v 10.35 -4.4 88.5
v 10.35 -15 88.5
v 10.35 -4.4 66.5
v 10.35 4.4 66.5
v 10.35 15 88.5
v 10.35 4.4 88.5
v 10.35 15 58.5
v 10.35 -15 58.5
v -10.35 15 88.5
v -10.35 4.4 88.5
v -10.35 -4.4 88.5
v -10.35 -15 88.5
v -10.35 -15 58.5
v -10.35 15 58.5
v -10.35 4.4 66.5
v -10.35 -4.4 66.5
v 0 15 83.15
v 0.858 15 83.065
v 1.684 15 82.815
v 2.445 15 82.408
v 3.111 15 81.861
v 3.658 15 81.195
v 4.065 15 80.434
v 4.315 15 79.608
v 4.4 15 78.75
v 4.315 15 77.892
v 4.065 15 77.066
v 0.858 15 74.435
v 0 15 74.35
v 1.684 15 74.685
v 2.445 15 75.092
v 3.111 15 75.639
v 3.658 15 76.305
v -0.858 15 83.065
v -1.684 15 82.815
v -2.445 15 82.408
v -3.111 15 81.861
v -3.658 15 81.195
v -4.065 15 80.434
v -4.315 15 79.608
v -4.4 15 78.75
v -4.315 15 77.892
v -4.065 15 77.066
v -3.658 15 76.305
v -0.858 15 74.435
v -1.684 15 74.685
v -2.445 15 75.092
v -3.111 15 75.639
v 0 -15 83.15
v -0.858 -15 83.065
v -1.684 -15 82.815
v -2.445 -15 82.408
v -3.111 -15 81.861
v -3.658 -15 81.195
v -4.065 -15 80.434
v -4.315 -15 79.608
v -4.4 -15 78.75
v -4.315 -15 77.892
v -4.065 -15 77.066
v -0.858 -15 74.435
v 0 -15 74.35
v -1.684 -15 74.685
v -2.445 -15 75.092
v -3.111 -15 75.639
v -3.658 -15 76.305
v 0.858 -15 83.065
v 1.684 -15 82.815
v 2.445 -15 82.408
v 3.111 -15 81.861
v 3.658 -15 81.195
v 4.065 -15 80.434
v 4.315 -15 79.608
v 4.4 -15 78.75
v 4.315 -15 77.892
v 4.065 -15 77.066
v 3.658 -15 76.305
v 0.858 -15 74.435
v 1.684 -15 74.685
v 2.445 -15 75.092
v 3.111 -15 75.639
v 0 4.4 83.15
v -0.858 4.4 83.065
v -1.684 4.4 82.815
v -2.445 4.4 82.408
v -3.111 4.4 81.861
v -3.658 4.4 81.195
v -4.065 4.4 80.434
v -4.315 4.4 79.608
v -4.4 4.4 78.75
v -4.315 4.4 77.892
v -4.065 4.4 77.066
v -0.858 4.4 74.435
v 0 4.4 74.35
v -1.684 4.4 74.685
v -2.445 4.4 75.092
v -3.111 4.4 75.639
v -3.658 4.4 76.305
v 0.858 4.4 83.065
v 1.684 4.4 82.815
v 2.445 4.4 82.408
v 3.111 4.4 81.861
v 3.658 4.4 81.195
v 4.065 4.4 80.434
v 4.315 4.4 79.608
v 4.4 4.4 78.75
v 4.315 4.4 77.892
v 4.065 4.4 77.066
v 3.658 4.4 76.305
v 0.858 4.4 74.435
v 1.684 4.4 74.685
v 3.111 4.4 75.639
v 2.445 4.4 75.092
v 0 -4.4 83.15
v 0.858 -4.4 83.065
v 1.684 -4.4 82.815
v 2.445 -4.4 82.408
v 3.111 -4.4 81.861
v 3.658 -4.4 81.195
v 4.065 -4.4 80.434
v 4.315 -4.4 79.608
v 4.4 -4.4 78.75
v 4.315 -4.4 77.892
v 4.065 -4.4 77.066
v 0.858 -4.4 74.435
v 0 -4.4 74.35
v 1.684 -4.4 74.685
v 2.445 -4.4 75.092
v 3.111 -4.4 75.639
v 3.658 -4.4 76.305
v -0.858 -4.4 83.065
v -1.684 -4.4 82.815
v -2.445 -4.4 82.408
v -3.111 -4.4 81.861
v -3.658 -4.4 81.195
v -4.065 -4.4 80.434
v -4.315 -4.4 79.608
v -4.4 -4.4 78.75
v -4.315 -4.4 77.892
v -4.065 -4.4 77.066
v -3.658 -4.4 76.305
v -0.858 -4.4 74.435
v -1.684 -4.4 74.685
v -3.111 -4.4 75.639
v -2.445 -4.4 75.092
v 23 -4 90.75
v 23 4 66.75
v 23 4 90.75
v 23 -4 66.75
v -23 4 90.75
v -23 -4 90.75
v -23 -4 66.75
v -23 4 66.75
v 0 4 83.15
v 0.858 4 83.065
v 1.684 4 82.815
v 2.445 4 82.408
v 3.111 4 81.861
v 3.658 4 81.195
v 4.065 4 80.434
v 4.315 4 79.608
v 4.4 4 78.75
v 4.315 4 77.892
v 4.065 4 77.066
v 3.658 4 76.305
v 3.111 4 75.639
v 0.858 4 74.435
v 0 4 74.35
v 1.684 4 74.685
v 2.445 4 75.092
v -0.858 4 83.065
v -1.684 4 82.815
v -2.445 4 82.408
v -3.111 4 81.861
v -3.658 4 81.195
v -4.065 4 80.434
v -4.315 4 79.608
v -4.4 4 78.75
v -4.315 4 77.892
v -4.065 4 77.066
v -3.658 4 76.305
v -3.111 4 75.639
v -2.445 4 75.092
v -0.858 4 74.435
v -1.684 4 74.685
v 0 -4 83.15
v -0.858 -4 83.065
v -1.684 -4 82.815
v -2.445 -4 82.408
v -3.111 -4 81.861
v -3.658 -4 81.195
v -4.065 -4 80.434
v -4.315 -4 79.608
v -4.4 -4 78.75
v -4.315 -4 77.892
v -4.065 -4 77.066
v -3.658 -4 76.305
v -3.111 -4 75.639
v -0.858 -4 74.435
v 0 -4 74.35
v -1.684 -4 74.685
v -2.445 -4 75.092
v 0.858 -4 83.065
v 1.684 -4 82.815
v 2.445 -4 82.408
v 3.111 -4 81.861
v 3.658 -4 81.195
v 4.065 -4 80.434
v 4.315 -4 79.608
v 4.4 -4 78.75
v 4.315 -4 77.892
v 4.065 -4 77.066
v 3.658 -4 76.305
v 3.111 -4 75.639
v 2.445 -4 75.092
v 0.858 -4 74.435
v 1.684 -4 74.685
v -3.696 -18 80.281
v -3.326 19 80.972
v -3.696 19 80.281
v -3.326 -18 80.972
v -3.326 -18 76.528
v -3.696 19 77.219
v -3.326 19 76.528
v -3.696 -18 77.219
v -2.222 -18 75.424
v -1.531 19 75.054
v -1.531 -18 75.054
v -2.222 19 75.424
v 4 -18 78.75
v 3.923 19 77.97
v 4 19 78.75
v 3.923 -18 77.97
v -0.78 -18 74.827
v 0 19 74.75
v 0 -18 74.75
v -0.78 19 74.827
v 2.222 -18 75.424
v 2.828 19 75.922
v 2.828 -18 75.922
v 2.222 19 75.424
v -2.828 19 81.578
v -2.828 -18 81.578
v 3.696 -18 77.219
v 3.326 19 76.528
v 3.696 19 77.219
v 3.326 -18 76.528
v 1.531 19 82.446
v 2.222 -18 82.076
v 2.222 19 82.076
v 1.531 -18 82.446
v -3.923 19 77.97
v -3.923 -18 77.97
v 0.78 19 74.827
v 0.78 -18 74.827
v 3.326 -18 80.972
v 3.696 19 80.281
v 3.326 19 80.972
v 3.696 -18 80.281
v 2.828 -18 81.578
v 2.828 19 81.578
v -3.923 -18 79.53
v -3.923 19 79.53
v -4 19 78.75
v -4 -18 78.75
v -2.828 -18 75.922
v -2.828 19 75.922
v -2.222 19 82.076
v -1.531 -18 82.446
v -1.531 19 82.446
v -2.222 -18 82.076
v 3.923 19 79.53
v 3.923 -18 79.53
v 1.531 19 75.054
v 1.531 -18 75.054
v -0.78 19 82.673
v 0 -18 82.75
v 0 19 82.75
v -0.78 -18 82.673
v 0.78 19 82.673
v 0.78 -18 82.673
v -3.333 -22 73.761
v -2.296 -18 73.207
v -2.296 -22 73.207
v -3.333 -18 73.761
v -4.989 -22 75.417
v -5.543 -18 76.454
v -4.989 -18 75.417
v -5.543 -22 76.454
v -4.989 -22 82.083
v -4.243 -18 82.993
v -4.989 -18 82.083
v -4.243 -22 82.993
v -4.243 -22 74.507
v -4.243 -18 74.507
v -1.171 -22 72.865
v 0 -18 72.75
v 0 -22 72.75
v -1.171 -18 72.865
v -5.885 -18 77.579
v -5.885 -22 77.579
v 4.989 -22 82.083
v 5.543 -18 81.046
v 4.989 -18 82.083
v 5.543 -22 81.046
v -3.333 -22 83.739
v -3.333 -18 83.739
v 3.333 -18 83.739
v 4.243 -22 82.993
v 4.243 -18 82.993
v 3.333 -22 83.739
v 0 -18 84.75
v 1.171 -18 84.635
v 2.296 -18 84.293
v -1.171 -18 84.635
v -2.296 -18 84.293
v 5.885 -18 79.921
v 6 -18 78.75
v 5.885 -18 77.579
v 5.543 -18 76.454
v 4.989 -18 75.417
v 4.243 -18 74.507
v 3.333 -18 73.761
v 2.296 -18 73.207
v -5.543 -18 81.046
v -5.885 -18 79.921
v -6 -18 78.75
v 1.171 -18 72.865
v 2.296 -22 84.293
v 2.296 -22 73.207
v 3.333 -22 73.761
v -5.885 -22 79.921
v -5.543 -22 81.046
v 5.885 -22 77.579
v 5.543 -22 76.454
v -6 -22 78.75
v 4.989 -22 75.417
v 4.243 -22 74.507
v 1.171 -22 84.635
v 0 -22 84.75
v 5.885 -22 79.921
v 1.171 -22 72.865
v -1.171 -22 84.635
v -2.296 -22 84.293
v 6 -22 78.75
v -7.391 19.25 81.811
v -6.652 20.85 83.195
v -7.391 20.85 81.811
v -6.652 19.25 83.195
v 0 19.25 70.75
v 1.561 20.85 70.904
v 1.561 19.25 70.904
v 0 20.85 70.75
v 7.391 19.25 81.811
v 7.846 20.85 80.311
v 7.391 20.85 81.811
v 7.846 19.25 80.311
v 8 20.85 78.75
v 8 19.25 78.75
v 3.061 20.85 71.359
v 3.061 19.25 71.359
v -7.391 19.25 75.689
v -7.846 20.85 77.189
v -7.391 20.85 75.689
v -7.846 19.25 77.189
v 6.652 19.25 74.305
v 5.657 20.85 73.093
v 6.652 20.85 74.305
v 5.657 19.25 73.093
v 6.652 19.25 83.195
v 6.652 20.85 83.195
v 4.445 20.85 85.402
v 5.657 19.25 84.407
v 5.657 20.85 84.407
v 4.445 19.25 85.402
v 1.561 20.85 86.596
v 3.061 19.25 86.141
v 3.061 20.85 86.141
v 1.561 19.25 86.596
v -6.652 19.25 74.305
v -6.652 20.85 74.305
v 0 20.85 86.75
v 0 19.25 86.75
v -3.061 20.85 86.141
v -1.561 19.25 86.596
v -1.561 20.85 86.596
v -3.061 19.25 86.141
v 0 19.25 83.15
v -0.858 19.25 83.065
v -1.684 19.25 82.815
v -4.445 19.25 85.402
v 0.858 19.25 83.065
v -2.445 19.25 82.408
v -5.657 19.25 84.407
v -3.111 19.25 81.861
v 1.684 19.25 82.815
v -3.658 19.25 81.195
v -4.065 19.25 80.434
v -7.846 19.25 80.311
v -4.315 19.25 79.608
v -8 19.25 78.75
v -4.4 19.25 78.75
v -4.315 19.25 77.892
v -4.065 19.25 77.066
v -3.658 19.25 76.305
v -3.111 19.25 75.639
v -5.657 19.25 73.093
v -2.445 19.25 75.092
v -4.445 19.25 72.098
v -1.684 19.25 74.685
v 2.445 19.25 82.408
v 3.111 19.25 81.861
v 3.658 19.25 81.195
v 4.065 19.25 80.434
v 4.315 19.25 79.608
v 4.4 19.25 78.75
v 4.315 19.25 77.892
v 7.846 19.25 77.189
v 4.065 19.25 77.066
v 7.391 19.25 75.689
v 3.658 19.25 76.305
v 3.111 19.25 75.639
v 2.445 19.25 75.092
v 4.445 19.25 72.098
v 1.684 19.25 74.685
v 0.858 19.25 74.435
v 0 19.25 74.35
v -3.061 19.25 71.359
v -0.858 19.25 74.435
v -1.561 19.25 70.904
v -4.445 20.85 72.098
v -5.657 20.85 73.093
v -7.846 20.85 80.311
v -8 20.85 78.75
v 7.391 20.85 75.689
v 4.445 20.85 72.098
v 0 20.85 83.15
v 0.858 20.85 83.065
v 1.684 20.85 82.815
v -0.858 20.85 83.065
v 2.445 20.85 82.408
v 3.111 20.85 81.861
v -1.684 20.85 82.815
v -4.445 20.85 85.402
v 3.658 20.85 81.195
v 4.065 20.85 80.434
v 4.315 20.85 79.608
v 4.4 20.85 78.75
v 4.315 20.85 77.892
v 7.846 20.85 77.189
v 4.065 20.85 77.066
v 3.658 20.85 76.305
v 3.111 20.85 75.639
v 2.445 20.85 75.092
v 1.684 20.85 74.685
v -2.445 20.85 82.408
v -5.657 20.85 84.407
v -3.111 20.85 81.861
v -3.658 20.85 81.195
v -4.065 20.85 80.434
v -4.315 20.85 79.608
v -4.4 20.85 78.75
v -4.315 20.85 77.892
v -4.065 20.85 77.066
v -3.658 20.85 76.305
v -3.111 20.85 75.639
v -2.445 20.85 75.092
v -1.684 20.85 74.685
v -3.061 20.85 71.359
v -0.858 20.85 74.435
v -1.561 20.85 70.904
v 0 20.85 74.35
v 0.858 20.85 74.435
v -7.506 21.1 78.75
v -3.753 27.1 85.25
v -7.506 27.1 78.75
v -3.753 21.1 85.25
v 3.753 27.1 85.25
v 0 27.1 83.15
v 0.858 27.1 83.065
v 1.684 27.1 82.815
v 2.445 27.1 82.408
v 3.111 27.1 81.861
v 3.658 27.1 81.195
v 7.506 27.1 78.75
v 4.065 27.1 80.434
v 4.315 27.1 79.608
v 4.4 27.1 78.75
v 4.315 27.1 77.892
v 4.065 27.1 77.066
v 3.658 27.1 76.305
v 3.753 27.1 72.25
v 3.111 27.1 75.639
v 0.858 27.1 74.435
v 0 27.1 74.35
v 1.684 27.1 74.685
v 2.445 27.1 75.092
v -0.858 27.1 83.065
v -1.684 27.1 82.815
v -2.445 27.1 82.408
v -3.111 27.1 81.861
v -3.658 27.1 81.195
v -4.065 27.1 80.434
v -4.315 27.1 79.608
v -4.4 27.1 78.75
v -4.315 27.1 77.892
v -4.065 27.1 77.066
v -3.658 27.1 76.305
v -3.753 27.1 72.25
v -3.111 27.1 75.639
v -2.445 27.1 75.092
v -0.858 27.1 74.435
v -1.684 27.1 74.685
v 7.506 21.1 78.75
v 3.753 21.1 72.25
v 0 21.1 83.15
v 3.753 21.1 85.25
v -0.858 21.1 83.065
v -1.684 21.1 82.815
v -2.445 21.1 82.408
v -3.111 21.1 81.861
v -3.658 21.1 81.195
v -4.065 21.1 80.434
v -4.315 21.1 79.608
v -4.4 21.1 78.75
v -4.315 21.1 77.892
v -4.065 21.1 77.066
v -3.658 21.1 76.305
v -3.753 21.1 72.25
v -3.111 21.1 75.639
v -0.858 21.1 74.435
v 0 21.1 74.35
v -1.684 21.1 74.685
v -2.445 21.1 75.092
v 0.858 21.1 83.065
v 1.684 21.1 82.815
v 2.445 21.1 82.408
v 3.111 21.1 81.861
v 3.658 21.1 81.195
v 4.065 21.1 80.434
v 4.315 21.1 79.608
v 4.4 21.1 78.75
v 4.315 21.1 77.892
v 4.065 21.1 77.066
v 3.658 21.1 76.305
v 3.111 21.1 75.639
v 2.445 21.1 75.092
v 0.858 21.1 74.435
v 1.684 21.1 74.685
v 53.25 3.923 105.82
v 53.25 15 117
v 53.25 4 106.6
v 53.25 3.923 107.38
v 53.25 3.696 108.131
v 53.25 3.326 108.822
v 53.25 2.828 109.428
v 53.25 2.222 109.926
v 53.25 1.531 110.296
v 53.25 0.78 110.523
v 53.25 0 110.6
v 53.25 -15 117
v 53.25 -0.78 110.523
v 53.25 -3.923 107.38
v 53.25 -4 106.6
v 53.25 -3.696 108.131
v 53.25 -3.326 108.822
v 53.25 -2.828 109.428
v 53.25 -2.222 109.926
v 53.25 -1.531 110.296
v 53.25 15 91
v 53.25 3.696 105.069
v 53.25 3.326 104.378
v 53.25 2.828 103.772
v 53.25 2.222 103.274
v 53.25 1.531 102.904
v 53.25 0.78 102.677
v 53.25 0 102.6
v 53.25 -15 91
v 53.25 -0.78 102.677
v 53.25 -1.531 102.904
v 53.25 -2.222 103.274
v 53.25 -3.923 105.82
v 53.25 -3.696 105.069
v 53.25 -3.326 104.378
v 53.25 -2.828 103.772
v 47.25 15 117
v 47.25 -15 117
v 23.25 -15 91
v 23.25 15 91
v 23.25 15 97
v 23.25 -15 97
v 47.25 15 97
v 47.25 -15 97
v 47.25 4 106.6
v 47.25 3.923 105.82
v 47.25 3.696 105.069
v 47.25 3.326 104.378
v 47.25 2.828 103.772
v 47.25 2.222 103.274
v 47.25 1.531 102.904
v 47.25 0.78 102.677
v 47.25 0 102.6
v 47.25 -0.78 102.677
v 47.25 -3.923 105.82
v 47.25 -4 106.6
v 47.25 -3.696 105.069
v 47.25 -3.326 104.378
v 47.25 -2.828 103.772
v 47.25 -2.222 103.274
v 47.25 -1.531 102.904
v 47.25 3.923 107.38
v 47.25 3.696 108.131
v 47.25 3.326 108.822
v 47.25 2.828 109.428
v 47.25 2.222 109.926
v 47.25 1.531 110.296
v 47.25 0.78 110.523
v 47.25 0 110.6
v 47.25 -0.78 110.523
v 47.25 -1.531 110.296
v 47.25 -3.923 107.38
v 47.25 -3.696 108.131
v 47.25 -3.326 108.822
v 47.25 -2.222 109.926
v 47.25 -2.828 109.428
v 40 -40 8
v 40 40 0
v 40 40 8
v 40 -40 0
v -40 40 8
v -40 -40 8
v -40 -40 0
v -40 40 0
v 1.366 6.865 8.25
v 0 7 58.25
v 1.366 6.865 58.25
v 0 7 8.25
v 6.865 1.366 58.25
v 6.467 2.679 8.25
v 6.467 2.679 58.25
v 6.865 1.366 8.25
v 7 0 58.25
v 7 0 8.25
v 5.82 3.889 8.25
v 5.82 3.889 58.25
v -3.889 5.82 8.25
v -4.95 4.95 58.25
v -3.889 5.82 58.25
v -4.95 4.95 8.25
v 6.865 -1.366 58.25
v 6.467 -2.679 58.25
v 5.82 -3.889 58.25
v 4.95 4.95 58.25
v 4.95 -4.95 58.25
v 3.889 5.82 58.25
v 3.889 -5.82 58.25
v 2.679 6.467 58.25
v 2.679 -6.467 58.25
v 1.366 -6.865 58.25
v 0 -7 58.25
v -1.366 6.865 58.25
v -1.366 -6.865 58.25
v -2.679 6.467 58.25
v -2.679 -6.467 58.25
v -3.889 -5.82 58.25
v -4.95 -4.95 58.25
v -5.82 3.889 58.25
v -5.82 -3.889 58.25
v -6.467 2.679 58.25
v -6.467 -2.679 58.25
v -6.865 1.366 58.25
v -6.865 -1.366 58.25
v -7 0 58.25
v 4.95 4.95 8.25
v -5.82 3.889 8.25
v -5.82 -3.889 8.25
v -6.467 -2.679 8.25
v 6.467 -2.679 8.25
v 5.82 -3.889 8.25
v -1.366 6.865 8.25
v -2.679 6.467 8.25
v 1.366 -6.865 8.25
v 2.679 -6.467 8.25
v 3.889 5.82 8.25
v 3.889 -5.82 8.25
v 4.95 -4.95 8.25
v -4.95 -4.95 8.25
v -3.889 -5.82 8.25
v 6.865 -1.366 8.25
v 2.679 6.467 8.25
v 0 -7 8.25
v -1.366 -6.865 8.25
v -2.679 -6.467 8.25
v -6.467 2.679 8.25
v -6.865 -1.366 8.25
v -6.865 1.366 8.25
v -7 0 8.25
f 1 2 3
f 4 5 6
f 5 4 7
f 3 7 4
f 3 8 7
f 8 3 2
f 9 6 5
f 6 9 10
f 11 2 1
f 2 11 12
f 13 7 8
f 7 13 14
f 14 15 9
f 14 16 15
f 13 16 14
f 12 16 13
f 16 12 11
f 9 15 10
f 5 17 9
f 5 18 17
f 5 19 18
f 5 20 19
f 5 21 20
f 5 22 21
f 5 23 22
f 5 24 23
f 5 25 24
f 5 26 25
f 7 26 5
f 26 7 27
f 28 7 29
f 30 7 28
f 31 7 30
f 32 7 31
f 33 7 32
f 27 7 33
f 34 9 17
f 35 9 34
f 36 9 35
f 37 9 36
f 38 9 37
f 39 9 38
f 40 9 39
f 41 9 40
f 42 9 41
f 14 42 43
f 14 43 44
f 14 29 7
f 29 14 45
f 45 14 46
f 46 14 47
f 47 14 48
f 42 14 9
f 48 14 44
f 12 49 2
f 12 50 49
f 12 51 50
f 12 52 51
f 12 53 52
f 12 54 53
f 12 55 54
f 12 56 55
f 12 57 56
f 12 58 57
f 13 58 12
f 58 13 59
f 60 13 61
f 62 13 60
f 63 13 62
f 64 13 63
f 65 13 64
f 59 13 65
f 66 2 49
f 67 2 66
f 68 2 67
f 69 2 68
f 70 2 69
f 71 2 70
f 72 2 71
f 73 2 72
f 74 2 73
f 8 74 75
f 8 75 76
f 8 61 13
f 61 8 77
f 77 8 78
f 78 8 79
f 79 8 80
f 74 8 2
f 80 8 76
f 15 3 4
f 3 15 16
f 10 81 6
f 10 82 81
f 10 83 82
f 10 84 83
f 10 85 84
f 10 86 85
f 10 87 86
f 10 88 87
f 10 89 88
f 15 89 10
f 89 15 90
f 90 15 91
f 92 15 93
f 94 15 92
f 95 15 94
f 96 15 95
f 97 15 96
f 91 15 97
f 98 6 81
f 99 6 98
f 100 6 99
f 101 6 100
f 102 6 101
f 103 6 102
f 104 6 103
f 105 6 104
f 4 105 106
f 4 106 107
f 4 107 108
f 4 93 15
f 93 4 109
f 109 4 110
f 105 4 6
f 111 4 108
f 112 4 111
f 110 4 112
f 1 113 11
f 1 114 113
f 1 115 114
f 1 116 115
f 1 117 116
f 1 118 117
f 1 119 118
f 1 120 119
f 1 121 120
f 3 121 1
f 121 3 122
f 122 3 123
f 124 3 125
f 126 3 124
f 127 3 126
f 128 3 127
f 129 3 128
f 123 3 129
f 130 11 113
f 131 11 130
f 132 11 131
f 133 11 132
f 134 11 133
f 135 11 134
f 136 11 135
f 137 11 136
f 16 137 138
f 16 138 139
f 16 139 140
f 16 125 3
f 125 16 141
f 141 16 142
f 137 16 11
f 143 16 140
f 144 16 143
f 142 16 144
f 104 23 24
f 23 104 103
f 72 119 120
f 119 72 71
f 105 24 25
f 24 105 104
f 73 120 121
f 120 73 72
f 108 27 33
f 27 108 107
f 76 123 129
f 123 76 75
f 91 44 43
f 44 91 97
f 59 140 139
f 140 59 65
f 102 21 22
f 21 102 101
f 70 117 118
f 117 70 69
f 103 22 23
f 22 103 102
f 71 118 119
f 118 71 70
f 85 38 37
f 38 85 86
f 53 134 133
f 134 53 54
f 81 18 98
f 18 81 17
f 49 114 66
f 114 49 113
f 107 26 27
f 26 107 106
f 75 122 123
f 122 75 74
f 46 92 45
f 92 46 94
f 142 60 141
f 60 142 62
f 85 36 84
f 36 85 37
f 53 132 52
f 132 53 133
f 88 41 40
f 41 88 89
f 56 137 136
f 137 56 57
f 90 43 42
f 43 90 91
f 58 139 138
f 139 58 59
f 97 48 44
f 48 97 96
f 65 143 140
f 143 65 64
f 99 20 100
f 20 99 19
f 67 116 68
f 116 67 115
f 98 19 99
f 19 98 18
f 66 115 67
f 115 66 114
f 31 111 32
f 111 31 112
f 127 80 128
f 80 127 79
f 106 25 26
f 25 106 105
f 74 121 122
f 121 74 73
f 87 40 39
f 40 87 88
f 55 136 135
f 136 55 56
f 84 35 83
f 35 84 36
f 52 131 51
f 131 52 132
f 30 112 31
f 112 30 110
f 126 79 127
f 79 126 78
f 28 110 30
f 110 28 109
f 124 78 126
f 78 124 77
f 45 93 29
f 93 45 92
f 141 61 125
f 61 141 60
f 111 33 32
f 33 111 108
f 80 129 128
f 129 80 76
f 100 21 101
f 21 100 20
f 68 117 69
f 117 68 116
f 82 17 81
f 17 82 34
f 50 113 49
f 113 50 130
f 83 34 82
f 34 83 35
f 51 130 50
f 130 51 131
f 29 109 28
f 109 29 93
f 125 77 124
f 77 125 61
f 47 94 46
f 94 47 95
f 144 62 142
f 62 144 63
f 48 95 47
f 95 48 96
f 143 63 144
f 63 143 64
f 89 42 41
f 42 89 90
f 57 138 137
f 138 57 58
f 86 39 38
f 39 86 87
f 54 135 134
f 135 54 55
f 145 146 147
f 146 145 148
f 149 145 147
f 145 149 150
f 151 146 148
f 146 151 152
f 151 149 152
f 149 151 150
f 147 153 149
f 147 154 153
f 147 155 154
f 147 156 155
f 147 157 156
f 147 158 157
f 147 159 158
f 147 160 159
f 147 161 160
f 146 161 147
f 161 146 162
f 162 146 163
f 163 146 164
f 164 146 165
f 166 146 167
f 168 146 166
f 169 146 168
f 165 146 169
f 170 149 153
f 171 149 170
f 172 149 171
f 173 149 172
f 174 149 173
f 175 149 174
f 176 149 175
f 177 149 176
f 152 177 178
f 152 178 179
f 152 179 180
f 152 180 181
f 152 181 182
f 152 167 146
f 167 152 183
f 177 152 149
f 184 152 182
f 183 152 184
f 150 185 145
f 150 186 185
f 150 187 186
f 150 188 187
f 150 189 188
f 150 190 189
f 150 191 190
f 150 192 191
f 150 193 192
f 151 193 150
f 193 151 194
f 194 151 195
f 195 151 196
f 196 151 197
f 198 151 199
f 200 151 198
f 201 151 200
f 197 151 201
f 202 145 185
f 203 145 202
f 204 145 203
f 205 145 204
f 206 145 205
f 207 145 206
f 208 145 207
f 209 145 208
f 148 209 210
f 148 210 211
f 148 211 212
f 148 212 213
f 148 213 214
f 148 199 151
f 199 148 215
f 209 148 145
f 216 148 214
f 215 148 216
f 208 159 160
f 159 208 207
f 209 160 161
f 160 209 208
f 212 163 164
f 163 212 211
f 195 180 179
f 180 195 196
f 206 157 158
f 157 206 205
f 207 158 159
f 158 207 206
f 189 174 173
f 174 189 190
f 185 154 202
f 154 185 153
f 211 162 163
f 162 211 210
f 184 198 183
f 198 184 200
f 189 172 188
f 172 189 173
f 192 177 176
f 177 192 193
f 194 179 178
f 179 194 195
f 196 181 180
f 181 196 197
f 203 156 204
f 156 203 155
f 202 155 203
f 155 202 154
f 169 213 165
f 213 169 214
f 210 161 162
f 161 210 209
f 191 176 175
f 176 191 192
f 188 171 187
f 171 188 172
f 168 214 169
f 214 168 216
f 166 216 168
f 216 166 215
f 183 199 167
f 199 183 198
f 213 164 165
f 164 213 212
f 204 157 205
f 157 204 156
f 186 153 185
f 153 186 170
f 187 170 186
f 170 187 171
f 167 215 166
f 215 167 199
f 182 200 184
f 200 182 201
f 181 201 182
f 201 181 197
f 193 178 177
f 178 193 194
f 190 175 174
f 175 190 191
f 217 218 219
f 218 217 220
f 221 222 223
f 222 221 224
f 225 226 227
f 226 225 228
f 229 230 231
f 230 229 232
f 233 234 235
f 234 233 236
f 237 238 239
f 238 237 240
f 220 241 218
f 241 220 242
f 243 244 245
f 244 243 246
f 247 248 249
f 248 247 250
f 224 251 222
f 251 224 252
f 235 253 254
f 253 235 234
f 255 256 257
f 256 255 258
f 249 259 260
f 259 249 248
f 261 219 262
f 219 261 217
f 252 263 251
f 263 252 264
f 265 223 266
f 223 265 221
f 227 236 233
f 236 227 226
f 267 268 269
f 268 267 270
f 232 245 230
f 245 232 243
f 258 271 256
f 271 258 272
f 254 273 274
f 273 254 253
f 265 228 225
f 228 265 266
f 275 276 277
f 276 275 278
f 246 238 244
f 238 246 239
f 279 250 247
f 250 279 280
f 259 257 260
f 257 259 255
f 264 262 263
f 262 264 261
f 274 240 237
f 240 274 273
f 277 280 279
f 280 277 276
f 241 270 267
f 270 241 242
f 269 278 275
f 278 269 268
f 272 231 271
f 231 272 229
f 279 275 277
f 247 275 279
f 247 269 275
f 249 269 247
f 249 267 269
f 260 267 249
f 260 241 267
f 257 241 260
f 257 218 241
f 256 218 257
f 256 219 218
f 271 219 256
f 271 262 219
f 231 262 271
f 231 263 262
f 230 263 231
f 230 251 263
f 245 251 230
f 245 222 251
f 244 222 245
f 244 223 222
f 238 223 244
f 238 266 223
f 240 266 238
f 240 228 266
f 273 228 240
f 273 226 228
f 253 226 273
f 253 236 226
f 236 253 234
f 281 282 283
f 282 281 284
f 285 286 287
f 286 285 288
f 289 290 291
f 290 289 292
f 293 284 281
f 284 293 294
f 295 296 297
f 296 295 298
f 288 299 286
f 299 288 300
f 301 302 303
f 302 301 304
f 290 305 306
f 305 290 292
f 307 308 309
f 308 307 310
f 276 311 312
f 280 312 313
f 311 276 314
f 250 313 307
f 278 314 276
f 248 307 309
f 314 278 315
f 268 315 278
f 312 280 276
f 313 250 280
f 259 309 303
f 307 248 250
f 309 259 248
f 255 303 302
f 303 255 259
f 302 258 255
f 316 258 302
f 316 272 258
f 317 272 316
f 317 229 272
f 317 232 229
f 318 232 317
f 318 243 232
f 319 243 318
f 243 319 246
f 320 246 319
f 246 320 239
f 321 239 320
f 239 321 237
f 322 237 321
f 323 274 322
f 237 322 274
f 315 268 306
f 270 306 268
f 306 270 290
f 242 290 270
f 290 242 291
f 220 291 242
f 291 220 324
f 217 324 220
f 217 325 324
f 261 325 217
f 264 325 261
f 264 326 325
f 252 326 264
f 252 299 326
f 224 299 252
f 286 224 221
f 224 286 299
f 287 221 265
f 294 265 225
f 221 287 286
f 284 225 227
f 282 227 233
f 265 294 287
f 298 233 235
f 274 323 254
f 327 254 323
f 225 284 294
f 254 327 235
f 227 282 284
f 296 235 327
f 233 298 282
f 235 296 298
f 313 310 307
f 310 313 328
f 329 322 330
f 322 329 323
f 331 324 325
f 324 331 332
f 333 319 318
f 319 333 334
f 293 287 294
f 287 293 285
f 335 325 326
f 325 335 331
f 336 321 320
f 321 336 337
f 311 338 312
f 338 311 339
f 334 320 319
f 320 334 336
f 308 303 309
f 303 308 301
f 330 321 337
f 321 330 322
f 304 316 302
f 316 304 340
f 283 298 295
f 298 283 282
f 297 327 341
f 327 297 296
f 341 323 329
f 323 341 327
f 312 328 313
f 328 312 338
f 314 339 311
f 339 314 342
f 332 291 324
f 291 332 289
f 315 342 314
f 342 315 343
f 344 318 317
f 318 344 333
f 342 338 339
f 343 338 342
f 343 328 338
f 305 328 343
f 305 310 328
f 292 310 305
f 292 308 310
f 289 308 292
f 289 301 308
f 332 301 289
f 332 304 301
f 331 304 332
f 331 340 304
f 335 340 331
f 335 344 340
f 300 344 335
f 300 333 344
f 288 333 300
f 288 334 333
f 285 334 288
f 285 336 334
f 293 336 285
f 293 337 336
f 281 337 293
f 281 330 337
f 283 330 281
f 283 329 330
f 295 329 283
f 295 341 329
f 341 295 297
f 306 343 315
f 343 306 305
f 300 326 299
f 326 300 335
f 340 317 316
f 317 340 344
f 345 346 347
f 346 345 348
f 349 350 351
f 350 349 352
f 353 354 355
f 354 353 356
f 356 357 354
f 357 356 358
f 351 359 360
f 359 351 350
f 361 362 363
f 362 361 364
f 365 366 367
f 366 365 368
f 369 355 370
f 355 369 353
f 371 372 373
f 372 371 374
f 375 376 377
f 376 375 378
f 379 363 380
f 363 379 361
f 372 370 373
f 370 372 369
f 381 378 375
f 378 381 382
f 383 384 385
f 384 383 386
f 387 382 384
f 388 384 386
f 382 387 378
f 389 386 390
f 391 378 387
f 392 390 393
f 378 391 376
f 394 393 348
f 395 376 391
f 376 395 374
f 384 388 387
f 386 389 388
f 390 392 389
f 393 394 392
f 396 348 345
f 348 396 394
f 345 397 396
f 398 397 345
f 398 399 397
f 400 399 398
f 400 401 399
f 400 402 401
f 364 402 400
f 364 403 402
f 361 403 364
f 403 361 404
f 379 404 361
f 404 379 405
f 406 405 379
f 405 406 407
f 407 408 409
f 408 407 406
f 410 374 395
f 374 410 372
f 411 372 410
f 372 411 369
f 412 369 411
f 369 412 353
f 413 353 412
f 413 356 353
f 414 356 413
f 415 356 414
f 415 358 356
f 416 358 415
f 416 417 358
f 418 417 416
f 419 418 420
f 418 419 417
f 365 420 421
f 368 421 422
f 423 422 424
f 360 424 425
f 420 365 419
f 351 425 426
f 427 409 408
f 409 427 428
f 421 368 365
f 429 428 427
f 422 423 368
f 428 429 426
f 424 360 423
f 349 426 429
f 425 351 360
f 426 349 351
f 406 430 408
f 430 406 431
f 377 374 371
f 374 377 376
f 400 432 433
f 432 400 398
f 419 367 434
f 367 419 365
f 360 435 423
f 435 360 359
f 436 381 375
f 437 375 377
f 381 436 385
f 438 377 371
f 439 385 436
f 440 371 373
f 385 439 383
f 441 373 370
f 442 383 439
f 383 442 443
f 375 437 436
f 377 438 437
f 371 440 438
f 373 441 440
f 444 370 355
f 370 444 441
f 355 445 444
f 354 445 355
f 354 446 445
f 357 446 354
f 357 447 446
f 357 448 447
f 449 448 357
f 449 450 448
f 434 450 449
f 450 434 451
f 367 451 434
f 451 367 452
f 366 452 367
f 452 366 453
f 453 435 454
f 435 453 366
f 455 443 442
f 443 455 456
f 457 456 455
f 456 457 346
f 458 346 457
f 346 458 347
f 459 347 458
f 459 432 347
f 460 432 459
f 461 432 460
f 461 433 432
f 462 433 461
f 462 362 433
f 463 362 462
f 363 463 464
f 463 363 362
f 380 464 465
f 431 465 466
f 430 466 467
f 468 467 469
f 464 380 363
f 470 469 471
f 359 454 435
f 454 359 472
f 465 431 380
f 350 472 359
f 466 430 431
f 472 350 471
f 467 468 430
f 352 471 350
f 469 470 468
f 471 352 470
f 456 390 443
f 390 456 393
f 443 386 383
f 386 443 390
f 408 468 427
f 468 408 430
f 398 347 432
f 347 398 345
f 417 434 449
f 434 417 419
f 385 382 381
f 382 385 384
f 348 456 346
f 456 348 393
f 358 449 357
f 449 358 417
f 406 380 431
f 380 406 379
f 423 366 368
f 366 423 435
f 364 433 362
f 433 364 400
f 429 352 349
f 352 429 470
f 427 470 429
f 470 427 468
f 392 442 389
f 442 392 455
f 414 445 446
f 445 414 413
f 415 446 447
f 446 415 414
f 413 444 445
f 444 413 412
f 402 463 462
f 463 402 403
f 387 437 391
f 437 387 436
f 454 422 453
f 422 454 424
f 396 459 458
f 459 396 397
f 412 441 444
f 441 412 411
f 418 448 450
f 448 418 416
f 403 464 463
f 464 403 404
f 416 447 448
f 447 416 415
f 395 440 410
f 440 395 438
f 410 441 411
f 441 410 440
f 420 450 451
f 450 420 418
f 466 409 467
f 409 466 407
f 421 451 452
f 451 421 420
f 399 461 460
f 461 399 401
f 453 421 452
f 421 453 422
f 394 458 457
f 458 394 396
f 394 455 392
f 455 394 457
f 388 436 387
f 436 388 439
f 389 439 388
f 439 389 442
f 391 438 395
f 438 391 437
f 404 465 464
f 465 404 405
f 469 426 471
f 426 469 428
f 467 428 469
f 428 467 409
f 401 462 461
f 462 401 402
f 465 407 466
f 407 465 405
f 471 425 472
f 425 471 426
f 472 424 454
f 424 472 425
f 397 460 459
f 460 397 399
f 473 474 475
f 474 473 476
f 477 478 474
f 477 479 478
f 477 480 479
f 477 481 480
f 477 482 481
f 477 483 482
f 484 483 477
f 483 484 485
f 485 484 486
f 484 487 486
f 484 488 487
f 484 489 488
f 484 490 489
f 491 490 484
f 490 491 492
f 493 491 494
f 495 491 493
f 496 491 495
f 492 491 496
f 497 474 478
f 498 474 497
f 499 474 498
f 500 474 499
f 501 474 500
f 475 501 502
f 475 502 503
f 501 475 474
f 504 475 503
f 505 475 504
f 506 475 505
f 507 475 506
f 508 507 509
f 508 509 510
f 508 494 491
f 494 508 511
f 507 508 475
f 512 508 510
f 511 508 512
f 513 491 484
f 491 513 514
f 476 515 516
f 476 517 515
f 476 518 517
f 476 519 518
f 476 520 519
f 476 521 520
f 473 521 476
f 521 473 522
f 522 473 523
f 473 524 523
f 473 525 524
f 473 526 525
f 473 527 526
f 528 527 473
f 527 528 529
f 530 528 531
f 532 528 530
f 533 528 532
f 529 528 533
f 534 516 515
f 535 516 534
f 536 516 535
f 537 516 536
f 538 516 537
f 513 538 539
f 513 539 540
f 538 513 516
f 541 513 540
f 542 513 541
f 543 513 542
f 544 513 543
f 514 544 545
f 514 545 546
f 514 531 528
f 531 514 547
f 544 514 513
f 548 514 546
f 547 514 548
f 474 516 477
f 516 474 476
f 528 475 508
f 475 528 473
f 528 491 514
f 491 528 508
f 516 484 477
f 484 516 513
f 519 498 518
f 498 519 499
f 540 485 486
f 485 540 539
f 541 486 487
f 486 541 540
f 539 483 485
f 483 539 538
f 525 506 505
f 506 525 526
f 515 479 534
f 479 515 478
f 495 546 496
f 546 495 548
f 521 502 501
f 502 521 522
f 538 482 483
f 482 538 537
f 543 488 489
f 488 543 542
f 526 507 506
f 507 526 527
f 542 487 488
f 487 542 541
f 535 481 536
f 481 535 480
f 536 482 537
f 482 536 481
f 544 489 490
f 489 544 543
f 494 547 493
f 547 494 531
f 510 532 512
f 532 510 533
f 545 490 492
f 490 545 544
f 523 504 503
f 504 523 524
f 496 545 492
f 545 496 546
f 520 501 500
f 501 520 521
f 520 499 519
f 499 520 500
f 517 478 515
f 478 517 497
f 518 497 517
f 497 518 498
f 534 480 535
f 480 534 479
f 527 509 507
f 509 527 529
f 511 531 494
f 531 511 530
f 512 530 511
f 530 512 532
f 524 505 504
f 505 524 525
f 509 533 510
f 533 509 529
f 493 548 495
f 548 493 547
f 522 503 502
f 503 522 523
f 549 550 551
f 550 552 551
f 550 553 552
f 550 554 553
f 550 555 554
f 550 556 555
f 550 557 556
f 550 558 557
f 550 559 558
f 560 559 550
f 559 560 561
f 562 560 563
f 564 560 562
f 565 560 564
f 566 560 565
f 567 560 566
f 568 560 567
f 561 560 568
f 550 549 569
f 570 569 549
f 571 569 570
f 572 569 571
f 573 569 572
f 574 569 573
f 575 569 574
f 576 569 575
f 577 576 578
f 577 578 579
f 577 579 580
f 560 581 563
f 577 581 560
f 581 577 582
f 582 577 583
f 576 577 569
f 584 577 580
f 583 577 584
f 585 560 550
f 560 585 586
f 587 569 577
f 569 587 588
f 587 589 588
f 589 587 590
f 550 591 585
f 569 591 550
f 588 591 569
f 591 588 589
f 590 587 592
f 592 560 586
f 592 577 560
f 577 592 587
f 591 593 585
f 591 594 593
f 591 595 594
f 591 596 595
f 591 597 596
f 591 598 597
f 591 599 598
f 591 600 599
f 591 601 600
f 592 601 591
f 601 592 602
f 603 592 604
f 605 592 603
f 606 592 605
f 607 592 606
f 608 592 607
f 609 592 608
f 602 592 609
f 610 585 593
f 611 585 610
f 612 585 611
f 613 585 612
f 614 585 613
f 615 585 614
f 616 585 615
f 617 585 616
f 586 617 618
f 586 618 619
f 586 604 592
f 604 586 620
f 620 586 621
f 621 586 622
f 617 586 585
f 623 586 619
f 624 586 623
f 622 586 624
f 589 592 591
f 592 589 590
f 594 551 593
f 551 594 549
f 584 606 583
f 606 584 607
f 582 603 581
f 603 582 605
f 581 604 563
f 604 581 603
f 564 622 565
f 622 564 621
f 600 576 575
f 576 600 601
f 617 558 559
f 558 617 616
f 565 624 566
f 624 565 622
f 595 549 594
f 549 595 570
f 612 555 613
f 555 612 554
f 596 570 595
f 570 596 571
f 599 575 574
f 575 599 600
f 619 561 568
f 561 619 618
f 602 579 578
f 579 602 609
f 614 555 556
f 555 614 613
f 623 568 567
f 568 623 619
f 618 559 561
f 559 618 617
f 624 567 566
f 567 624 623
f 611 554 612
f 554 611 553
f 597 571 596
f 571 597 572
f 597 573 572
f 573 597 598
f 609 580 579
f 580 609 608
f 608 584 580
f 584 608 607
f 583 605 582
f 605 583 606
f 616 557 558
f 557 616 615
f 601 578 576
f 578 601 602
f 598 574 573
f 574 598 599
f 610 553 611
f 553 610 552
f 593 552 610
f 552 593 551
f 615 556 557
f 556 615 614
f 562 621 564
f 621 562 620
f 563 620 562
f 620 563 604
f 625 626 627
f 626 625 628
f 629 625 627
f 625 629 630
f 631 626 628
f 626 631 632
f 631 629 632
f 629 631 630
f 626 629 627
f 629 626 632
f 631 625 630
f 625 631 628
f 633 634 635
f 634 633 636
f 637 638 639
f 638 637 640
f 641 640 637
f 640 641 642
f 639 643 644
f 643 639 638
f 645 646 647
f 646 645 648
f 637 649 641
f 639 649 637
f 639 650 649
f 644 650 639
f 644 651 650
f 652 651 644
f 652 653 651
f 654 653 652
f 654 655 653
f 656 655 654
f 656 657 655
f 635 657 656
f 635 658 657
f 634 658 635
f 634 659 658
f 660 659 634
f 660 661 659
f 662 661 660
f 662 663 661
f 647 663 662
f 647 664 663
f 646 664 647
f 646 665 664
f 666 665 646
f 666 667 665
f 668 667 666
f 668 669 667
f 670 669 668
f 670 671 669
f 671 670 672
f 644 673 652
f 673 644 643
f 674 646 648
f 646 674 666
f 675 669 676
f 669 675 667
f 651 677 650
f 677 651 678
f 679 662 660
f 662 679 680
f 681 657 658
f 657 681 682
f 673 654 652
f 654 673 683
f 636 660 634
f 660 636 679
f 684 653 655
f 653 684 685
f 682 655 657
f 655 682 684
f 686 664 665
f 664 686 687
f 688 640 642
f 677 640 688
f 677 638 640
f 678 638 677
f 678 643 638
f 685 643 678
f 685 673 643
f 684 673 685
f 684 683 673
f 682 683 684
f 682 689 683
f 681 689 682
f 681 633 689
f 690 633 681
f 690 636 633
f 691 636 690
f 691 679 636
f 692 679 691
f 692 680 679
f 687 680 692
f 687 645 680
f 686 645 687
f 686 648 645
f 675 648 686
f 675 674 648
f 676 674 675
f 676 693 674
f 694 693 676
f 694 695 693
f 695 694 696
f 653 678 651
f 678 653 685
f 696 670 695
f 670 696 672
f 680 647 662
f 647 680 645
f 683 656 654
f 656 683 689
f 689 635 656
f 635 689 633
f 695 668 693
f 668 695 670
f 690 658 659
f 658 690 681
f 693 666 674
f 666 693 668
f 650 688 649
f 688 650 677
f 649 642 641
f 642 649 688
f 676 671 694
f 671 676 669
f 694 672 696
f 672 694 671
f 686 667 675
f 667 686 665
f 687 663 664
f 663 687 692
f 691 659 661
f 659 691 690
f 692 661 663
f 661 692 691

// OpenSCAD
$fn = 32;

// ------------------------------------------------------------------------
// Lamp arm: column d14 x 50 mm, arm 46 mm
// Every part is its own module, assembly() places every instance.
// ------------------------------------------------------------------------

// --- part 1 ---
module lamp_base() {
  difference() {
    translate([-40, -40, 0]) cube([80, 80, 8]);
  }
}

// --- part 2 ---
module lamp_column() {
  cylinder(h = 50, d = 14);
}

// --- part 3 ---
module head_fork() {
  difference() {
    translate([-10.35, -15, 0]) cube([20.7, 30, 30]);
    translate([-11.35, -4.4, 8]) cube([22.7, 8.8, 23]);
    translate([0, 0, 20.25]) rotate([90, 0, 0]) cylinder(h = 32, d = 8.8, center = true);
  }
}

// --- part 4 ---
module lamp_arm() {
  difference() {
    translate([-23, -4, 0]) cube([46, 8, 24]);
    translate([0, 0, 12]) rotate([90, 0, 0]) cylinder(h = 10, d = 8.8, center = true);
  }
}

// --- part 5 ---
module arm_pin() {
  rotate([0, 90, 0]) cylinder(h = 38, d = 8, center = true);
  translate([-22, 0, 0]) rotate([0, 90, 0]) cylinder(h = 4, d = 12);
}

// --- part 6 ---
module arm_washer() {
  difference() {
      translate([0, 0, 0]) cylinder(h = 1.6, d = 16);
      translate([0, 0, -1]) cylinder(h = 3.6, d = 8.8);
    }
}

// --- part 7 ---
module arm_nut() {
  difference() {
    linear_extrude(height = 6) polygon(points = [[7.506, 0], [3.753, 6.5], [-3.753, 6.5], [-7.506, 0], [-3.753, -6.5], [3.753, -6.5]]);
    translate([0, 0, -1]) cylinder(h = 8, d = 8.8);
  }
}

// --- part 8 ---
module shade_bracket() {
  difference() {
    translate([-15, -15, 0]) cube([30, 30, 26]);
    translate([-16, -16, 6]) cube([25, 32, 21]);
    translate([12, 0, 15.6]) rotate([0, 90, 0]) cylinder(h = 8, d = 8, center = true);
  }
}

// --- assembly ---
module assembly() {
  color([0.80, 0.24, 0.20]) translate([0, 0, 0]) rotate([0, 0, 0]) lamp_base();
  color([0.20, 0.45, 0.75]) translate([0, 0, 8.25]) rotate([0, 0, 0]) lamp_column();
  color([0.25, 0.62, 0.32]) translate([0, 0, 58.5]) rotate([0, 0, 0]) head_fork();
  color([0.92, 0.70, 0.18]) translate([0, 0, 66.75]) rotate([0, 0, 0]) lamp_arm();
  color([0.58, 0.35, 0.70]) translate([0, 0, 78.75]) rotate([0, 0, 90]) arm_pin();
  color([0.16, 0.66, 0.66]) translate([0, 20.85, 78.75]) rotate([90, 0, 0]) arm_washer();
  color([0.85, 0.48, 0.18]) translate([0, 27.1, 78.75]) rotate([90, 0, 0]) arm_nut();
  color([0.55, 0.60, 0.65]) translate([38.25, 0, 91]) rotate([0, 0, 0]) shade_bracket();
}

assembly();
